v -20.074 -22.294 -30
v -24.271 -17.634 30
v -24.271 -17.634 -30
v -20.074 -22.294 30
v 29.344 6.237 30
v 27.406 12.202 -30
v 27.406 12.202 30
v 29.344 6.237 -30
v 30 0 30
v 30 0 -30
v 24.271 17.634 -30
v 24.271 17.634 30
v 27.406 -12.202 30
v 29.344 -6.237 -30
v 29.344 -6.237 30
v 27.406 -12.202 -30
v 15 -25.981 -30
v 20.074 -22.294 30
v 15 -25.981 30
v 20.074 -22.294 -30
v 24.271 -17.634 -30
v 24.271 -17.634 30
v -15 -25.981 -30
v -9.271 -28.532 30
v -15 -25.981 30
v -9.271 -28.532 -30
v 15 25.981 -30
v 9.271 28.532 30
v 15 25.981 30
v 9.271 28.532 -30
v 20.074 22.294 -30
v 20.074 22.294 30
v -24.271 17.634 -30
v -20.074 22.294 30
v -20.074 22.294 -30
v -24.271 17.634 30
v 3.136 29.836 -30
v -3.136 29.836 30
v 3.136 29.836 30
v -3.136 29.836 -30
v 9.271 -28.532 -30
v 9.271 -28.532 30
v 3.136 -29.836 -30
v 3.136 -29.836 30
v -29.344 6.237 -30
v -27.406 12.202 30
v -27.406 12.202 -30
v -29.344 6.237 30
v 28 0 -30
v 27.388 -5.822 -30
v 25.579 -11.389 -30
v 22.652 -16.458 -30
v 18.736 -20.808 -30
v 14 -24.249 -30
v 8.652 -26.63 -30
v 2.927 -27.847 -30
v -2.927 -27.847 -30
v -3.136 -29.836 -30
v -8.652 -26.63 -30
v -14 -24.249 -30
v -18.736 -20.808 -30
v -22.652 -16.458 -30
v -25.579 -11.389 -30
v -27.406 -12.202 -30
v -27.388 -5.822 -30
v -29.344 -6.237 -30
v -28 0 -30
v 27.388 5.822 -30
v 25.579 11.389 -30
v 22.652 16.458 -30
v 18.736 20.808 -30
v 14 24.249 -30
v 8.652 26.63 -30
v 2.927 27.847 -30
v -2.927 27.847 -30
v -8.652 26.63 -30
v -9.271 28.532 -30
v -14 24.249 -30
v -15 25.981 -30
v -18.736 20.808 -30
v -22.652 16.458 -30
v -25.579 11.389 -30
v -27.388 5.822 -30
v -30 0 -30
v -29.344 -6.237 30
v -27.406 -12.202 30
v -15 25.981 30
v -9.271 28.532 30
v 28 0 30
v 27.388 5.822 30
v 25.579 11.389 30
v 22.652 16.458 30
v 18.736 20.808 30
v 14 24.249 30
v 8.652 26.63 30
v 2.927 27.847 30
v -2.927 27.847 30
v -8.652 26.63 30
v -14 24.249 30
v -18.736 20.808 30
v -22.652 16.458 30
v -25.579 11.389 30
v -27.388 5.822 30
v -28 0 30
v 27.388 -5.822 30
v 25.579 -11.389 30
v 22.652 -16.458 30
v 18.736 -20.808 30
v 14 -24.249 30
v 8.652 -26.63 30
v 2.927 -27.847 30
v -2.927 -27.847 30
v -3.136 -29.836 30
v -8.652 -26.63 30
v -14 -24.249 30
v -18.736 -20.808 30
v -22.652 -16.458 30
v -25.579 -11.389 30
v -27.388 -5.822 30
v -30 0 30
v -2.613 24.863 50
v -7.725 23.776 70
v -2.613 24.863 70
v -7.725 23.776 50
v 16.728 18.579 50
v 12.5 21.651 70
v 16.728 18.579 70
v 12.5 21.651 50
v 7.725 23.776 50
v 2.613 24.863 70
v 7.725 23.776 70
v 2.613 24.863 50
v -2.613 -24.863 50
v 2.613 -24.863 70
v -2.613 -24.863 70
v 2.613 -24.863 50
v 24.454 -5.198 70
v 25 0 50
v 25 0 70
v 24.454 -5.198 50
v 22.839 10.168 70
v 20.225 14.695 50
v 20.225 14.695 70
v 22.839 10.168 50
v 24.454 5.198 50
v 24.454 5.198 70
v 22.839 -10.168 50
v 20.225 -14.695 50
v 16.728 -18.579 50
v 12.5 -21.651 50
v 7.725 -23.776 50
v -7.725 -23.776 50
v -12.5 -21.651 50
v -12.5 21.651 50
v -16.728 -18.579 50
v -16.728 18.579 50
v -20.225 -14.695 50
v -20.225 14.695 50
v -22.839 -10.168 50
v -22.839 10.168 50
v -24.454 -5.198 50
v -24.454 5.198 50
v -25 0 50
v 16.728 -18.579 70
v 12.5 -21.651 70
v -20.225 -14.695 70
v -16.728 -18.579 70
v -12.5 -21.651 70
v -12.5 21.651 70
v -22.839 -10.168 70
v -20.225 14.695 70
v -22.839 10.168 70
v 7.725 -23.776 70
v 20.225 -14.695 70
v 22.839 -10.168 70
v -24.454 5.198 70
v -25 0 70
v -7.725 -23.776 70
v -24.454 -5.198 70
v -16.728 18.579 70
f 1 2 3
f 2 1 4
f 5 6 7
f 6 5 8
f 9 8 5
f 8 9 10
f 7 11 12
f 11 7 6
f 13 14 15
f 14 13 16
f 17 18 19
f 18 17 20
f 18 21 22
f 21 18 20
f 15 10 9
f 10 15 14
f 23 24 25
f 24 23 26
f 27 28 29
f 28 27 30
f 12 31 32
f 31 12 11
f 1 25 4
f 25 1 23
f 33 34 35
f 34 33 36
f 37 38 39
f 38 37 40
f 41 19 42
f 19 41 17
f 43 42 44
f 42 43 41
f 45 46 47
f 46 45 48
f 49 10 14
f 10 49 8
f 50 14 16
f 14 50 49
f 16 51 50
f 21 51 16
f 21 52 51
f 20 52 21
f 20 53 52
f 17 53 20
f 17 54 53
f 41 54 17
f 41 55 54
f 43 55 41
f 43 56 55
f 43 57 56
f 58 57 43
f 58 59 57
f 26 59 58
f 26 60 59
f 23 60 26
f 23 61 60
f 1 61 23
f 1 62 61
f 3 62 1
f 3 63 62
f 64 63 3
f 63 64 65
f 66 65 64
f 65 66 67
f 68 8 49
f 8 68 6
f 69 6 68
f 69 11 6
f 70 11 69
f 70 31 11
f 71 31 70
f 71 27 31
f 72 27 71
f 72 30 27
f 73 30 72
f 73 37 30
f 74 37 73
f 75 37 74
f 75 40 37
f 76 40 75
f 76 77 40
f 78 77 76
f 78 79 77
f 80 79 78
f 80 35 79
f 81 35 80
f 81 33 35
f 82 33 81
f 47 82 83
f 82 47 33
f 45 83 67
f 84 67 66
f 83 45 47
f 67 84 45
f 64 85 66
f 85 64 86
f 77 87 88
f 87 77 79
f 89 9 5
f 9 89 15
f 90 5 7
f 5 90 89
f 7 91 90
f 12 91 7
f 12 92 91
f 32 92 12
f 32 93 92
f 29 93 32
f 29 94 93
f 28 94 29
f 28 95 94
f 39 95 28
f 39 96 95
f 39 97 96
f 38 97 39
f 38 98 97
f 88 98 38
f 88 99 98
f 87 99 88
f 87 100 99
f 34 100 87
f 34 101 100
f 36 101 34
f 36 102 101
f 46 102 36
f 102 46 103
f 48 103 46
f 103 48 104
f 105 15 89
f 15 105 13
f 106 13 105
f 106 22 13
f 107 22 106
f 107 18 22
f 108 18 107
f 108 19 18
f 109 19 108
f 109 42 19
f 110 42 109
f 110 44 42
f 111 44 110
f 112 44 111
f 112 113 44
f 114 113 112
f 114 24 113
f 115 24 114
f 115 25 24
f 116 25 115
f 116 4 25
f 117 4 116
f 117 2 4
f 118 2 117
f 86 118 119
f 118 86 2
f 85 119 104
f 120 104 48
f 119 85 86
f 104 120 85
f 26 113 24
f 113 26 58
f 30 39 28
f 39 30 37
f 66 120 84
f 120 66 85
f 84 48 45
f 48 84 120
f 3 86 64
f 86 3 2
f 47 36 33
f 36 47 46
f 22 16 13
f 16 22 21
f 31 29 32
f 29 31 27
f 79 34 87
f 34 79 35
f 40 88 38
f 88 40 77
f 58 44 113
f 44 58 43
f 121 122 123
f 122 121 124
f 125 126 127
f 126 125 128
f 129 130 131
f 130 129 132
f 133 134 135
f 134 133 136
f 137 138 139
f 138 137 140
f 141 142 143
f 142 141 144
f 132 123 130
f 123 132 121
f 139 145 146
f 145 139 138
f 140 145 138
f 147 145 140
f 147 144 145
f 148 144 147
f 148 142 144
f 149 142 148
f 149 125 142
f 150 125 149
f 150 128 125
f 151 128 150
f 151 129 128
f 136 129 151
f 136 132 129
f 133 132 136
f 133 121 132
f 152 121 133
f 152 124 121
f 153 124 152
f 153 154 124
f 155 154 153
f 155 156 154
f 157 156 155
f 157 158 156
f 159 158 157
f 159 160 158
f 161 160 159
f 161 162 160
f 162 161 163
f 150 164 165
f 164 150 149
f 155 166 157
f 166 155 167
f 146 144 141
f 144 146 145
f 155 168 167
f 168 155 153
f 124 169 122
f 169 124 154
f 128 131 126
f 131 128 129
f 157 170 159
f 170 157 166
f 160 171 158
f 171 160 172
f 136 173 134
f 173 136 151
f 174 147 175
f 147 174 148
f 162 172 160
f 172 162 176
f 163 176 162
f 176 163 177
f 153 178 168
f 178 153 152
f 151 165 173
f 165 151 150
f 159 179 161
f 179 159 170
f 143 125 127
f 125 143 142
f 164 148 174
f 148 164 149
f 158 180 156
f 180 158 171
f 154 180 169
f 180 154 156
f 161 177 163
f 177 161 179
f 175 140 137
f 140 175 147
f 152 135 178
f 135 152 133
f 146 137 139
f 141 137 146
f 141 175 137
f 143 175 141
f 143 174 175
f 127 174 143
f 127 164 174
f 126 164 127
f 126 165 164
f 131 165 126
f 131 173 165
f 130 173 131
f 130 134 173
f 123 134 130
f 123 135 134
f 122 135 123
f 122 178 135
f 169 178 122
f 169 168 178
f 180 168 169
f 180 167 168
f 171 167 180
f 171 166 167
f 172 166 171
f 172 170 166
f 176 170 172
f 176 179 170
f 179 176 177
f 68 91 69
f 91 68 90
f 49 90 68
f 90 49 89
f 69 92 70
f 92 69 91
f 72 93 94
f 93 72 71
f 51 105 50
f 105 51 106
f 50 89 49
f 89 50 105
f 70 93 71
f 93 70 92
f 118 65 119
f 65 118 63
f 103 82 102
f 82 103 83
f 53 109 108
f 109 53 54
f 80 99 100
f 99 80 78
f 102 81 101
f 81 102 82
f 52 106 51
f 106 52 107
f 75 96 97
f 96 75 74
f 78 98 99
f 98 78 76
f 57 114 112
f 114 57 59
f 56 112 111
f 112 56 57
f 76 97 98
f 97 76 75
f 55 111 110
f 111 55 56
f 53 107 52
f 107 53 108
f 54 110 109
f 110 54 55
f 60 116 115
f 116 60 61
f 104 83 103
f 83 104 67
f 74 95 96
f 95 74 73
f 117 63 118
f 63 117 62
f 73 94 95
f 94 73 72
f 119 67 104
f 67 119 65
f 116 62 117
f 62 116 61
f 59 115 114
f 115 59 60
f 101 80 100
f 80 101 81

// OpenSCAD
//
//   Code generated by ChatGPT for the query below
//
//   Can you write me OpenSCAD code to create a model of a mug?
//
//   Created Jan 2023 by Jenny List, for a Hackaday article.
//


module mug() {
  difference() {
    union() {
      cylinder(r=30, h=60, center=true);
      translate([0, 0, 60]) cylinder(r=25, h=20, center=true);
    }
    cylinder(r=28, h=62, center=true);
  }
}

mug();
